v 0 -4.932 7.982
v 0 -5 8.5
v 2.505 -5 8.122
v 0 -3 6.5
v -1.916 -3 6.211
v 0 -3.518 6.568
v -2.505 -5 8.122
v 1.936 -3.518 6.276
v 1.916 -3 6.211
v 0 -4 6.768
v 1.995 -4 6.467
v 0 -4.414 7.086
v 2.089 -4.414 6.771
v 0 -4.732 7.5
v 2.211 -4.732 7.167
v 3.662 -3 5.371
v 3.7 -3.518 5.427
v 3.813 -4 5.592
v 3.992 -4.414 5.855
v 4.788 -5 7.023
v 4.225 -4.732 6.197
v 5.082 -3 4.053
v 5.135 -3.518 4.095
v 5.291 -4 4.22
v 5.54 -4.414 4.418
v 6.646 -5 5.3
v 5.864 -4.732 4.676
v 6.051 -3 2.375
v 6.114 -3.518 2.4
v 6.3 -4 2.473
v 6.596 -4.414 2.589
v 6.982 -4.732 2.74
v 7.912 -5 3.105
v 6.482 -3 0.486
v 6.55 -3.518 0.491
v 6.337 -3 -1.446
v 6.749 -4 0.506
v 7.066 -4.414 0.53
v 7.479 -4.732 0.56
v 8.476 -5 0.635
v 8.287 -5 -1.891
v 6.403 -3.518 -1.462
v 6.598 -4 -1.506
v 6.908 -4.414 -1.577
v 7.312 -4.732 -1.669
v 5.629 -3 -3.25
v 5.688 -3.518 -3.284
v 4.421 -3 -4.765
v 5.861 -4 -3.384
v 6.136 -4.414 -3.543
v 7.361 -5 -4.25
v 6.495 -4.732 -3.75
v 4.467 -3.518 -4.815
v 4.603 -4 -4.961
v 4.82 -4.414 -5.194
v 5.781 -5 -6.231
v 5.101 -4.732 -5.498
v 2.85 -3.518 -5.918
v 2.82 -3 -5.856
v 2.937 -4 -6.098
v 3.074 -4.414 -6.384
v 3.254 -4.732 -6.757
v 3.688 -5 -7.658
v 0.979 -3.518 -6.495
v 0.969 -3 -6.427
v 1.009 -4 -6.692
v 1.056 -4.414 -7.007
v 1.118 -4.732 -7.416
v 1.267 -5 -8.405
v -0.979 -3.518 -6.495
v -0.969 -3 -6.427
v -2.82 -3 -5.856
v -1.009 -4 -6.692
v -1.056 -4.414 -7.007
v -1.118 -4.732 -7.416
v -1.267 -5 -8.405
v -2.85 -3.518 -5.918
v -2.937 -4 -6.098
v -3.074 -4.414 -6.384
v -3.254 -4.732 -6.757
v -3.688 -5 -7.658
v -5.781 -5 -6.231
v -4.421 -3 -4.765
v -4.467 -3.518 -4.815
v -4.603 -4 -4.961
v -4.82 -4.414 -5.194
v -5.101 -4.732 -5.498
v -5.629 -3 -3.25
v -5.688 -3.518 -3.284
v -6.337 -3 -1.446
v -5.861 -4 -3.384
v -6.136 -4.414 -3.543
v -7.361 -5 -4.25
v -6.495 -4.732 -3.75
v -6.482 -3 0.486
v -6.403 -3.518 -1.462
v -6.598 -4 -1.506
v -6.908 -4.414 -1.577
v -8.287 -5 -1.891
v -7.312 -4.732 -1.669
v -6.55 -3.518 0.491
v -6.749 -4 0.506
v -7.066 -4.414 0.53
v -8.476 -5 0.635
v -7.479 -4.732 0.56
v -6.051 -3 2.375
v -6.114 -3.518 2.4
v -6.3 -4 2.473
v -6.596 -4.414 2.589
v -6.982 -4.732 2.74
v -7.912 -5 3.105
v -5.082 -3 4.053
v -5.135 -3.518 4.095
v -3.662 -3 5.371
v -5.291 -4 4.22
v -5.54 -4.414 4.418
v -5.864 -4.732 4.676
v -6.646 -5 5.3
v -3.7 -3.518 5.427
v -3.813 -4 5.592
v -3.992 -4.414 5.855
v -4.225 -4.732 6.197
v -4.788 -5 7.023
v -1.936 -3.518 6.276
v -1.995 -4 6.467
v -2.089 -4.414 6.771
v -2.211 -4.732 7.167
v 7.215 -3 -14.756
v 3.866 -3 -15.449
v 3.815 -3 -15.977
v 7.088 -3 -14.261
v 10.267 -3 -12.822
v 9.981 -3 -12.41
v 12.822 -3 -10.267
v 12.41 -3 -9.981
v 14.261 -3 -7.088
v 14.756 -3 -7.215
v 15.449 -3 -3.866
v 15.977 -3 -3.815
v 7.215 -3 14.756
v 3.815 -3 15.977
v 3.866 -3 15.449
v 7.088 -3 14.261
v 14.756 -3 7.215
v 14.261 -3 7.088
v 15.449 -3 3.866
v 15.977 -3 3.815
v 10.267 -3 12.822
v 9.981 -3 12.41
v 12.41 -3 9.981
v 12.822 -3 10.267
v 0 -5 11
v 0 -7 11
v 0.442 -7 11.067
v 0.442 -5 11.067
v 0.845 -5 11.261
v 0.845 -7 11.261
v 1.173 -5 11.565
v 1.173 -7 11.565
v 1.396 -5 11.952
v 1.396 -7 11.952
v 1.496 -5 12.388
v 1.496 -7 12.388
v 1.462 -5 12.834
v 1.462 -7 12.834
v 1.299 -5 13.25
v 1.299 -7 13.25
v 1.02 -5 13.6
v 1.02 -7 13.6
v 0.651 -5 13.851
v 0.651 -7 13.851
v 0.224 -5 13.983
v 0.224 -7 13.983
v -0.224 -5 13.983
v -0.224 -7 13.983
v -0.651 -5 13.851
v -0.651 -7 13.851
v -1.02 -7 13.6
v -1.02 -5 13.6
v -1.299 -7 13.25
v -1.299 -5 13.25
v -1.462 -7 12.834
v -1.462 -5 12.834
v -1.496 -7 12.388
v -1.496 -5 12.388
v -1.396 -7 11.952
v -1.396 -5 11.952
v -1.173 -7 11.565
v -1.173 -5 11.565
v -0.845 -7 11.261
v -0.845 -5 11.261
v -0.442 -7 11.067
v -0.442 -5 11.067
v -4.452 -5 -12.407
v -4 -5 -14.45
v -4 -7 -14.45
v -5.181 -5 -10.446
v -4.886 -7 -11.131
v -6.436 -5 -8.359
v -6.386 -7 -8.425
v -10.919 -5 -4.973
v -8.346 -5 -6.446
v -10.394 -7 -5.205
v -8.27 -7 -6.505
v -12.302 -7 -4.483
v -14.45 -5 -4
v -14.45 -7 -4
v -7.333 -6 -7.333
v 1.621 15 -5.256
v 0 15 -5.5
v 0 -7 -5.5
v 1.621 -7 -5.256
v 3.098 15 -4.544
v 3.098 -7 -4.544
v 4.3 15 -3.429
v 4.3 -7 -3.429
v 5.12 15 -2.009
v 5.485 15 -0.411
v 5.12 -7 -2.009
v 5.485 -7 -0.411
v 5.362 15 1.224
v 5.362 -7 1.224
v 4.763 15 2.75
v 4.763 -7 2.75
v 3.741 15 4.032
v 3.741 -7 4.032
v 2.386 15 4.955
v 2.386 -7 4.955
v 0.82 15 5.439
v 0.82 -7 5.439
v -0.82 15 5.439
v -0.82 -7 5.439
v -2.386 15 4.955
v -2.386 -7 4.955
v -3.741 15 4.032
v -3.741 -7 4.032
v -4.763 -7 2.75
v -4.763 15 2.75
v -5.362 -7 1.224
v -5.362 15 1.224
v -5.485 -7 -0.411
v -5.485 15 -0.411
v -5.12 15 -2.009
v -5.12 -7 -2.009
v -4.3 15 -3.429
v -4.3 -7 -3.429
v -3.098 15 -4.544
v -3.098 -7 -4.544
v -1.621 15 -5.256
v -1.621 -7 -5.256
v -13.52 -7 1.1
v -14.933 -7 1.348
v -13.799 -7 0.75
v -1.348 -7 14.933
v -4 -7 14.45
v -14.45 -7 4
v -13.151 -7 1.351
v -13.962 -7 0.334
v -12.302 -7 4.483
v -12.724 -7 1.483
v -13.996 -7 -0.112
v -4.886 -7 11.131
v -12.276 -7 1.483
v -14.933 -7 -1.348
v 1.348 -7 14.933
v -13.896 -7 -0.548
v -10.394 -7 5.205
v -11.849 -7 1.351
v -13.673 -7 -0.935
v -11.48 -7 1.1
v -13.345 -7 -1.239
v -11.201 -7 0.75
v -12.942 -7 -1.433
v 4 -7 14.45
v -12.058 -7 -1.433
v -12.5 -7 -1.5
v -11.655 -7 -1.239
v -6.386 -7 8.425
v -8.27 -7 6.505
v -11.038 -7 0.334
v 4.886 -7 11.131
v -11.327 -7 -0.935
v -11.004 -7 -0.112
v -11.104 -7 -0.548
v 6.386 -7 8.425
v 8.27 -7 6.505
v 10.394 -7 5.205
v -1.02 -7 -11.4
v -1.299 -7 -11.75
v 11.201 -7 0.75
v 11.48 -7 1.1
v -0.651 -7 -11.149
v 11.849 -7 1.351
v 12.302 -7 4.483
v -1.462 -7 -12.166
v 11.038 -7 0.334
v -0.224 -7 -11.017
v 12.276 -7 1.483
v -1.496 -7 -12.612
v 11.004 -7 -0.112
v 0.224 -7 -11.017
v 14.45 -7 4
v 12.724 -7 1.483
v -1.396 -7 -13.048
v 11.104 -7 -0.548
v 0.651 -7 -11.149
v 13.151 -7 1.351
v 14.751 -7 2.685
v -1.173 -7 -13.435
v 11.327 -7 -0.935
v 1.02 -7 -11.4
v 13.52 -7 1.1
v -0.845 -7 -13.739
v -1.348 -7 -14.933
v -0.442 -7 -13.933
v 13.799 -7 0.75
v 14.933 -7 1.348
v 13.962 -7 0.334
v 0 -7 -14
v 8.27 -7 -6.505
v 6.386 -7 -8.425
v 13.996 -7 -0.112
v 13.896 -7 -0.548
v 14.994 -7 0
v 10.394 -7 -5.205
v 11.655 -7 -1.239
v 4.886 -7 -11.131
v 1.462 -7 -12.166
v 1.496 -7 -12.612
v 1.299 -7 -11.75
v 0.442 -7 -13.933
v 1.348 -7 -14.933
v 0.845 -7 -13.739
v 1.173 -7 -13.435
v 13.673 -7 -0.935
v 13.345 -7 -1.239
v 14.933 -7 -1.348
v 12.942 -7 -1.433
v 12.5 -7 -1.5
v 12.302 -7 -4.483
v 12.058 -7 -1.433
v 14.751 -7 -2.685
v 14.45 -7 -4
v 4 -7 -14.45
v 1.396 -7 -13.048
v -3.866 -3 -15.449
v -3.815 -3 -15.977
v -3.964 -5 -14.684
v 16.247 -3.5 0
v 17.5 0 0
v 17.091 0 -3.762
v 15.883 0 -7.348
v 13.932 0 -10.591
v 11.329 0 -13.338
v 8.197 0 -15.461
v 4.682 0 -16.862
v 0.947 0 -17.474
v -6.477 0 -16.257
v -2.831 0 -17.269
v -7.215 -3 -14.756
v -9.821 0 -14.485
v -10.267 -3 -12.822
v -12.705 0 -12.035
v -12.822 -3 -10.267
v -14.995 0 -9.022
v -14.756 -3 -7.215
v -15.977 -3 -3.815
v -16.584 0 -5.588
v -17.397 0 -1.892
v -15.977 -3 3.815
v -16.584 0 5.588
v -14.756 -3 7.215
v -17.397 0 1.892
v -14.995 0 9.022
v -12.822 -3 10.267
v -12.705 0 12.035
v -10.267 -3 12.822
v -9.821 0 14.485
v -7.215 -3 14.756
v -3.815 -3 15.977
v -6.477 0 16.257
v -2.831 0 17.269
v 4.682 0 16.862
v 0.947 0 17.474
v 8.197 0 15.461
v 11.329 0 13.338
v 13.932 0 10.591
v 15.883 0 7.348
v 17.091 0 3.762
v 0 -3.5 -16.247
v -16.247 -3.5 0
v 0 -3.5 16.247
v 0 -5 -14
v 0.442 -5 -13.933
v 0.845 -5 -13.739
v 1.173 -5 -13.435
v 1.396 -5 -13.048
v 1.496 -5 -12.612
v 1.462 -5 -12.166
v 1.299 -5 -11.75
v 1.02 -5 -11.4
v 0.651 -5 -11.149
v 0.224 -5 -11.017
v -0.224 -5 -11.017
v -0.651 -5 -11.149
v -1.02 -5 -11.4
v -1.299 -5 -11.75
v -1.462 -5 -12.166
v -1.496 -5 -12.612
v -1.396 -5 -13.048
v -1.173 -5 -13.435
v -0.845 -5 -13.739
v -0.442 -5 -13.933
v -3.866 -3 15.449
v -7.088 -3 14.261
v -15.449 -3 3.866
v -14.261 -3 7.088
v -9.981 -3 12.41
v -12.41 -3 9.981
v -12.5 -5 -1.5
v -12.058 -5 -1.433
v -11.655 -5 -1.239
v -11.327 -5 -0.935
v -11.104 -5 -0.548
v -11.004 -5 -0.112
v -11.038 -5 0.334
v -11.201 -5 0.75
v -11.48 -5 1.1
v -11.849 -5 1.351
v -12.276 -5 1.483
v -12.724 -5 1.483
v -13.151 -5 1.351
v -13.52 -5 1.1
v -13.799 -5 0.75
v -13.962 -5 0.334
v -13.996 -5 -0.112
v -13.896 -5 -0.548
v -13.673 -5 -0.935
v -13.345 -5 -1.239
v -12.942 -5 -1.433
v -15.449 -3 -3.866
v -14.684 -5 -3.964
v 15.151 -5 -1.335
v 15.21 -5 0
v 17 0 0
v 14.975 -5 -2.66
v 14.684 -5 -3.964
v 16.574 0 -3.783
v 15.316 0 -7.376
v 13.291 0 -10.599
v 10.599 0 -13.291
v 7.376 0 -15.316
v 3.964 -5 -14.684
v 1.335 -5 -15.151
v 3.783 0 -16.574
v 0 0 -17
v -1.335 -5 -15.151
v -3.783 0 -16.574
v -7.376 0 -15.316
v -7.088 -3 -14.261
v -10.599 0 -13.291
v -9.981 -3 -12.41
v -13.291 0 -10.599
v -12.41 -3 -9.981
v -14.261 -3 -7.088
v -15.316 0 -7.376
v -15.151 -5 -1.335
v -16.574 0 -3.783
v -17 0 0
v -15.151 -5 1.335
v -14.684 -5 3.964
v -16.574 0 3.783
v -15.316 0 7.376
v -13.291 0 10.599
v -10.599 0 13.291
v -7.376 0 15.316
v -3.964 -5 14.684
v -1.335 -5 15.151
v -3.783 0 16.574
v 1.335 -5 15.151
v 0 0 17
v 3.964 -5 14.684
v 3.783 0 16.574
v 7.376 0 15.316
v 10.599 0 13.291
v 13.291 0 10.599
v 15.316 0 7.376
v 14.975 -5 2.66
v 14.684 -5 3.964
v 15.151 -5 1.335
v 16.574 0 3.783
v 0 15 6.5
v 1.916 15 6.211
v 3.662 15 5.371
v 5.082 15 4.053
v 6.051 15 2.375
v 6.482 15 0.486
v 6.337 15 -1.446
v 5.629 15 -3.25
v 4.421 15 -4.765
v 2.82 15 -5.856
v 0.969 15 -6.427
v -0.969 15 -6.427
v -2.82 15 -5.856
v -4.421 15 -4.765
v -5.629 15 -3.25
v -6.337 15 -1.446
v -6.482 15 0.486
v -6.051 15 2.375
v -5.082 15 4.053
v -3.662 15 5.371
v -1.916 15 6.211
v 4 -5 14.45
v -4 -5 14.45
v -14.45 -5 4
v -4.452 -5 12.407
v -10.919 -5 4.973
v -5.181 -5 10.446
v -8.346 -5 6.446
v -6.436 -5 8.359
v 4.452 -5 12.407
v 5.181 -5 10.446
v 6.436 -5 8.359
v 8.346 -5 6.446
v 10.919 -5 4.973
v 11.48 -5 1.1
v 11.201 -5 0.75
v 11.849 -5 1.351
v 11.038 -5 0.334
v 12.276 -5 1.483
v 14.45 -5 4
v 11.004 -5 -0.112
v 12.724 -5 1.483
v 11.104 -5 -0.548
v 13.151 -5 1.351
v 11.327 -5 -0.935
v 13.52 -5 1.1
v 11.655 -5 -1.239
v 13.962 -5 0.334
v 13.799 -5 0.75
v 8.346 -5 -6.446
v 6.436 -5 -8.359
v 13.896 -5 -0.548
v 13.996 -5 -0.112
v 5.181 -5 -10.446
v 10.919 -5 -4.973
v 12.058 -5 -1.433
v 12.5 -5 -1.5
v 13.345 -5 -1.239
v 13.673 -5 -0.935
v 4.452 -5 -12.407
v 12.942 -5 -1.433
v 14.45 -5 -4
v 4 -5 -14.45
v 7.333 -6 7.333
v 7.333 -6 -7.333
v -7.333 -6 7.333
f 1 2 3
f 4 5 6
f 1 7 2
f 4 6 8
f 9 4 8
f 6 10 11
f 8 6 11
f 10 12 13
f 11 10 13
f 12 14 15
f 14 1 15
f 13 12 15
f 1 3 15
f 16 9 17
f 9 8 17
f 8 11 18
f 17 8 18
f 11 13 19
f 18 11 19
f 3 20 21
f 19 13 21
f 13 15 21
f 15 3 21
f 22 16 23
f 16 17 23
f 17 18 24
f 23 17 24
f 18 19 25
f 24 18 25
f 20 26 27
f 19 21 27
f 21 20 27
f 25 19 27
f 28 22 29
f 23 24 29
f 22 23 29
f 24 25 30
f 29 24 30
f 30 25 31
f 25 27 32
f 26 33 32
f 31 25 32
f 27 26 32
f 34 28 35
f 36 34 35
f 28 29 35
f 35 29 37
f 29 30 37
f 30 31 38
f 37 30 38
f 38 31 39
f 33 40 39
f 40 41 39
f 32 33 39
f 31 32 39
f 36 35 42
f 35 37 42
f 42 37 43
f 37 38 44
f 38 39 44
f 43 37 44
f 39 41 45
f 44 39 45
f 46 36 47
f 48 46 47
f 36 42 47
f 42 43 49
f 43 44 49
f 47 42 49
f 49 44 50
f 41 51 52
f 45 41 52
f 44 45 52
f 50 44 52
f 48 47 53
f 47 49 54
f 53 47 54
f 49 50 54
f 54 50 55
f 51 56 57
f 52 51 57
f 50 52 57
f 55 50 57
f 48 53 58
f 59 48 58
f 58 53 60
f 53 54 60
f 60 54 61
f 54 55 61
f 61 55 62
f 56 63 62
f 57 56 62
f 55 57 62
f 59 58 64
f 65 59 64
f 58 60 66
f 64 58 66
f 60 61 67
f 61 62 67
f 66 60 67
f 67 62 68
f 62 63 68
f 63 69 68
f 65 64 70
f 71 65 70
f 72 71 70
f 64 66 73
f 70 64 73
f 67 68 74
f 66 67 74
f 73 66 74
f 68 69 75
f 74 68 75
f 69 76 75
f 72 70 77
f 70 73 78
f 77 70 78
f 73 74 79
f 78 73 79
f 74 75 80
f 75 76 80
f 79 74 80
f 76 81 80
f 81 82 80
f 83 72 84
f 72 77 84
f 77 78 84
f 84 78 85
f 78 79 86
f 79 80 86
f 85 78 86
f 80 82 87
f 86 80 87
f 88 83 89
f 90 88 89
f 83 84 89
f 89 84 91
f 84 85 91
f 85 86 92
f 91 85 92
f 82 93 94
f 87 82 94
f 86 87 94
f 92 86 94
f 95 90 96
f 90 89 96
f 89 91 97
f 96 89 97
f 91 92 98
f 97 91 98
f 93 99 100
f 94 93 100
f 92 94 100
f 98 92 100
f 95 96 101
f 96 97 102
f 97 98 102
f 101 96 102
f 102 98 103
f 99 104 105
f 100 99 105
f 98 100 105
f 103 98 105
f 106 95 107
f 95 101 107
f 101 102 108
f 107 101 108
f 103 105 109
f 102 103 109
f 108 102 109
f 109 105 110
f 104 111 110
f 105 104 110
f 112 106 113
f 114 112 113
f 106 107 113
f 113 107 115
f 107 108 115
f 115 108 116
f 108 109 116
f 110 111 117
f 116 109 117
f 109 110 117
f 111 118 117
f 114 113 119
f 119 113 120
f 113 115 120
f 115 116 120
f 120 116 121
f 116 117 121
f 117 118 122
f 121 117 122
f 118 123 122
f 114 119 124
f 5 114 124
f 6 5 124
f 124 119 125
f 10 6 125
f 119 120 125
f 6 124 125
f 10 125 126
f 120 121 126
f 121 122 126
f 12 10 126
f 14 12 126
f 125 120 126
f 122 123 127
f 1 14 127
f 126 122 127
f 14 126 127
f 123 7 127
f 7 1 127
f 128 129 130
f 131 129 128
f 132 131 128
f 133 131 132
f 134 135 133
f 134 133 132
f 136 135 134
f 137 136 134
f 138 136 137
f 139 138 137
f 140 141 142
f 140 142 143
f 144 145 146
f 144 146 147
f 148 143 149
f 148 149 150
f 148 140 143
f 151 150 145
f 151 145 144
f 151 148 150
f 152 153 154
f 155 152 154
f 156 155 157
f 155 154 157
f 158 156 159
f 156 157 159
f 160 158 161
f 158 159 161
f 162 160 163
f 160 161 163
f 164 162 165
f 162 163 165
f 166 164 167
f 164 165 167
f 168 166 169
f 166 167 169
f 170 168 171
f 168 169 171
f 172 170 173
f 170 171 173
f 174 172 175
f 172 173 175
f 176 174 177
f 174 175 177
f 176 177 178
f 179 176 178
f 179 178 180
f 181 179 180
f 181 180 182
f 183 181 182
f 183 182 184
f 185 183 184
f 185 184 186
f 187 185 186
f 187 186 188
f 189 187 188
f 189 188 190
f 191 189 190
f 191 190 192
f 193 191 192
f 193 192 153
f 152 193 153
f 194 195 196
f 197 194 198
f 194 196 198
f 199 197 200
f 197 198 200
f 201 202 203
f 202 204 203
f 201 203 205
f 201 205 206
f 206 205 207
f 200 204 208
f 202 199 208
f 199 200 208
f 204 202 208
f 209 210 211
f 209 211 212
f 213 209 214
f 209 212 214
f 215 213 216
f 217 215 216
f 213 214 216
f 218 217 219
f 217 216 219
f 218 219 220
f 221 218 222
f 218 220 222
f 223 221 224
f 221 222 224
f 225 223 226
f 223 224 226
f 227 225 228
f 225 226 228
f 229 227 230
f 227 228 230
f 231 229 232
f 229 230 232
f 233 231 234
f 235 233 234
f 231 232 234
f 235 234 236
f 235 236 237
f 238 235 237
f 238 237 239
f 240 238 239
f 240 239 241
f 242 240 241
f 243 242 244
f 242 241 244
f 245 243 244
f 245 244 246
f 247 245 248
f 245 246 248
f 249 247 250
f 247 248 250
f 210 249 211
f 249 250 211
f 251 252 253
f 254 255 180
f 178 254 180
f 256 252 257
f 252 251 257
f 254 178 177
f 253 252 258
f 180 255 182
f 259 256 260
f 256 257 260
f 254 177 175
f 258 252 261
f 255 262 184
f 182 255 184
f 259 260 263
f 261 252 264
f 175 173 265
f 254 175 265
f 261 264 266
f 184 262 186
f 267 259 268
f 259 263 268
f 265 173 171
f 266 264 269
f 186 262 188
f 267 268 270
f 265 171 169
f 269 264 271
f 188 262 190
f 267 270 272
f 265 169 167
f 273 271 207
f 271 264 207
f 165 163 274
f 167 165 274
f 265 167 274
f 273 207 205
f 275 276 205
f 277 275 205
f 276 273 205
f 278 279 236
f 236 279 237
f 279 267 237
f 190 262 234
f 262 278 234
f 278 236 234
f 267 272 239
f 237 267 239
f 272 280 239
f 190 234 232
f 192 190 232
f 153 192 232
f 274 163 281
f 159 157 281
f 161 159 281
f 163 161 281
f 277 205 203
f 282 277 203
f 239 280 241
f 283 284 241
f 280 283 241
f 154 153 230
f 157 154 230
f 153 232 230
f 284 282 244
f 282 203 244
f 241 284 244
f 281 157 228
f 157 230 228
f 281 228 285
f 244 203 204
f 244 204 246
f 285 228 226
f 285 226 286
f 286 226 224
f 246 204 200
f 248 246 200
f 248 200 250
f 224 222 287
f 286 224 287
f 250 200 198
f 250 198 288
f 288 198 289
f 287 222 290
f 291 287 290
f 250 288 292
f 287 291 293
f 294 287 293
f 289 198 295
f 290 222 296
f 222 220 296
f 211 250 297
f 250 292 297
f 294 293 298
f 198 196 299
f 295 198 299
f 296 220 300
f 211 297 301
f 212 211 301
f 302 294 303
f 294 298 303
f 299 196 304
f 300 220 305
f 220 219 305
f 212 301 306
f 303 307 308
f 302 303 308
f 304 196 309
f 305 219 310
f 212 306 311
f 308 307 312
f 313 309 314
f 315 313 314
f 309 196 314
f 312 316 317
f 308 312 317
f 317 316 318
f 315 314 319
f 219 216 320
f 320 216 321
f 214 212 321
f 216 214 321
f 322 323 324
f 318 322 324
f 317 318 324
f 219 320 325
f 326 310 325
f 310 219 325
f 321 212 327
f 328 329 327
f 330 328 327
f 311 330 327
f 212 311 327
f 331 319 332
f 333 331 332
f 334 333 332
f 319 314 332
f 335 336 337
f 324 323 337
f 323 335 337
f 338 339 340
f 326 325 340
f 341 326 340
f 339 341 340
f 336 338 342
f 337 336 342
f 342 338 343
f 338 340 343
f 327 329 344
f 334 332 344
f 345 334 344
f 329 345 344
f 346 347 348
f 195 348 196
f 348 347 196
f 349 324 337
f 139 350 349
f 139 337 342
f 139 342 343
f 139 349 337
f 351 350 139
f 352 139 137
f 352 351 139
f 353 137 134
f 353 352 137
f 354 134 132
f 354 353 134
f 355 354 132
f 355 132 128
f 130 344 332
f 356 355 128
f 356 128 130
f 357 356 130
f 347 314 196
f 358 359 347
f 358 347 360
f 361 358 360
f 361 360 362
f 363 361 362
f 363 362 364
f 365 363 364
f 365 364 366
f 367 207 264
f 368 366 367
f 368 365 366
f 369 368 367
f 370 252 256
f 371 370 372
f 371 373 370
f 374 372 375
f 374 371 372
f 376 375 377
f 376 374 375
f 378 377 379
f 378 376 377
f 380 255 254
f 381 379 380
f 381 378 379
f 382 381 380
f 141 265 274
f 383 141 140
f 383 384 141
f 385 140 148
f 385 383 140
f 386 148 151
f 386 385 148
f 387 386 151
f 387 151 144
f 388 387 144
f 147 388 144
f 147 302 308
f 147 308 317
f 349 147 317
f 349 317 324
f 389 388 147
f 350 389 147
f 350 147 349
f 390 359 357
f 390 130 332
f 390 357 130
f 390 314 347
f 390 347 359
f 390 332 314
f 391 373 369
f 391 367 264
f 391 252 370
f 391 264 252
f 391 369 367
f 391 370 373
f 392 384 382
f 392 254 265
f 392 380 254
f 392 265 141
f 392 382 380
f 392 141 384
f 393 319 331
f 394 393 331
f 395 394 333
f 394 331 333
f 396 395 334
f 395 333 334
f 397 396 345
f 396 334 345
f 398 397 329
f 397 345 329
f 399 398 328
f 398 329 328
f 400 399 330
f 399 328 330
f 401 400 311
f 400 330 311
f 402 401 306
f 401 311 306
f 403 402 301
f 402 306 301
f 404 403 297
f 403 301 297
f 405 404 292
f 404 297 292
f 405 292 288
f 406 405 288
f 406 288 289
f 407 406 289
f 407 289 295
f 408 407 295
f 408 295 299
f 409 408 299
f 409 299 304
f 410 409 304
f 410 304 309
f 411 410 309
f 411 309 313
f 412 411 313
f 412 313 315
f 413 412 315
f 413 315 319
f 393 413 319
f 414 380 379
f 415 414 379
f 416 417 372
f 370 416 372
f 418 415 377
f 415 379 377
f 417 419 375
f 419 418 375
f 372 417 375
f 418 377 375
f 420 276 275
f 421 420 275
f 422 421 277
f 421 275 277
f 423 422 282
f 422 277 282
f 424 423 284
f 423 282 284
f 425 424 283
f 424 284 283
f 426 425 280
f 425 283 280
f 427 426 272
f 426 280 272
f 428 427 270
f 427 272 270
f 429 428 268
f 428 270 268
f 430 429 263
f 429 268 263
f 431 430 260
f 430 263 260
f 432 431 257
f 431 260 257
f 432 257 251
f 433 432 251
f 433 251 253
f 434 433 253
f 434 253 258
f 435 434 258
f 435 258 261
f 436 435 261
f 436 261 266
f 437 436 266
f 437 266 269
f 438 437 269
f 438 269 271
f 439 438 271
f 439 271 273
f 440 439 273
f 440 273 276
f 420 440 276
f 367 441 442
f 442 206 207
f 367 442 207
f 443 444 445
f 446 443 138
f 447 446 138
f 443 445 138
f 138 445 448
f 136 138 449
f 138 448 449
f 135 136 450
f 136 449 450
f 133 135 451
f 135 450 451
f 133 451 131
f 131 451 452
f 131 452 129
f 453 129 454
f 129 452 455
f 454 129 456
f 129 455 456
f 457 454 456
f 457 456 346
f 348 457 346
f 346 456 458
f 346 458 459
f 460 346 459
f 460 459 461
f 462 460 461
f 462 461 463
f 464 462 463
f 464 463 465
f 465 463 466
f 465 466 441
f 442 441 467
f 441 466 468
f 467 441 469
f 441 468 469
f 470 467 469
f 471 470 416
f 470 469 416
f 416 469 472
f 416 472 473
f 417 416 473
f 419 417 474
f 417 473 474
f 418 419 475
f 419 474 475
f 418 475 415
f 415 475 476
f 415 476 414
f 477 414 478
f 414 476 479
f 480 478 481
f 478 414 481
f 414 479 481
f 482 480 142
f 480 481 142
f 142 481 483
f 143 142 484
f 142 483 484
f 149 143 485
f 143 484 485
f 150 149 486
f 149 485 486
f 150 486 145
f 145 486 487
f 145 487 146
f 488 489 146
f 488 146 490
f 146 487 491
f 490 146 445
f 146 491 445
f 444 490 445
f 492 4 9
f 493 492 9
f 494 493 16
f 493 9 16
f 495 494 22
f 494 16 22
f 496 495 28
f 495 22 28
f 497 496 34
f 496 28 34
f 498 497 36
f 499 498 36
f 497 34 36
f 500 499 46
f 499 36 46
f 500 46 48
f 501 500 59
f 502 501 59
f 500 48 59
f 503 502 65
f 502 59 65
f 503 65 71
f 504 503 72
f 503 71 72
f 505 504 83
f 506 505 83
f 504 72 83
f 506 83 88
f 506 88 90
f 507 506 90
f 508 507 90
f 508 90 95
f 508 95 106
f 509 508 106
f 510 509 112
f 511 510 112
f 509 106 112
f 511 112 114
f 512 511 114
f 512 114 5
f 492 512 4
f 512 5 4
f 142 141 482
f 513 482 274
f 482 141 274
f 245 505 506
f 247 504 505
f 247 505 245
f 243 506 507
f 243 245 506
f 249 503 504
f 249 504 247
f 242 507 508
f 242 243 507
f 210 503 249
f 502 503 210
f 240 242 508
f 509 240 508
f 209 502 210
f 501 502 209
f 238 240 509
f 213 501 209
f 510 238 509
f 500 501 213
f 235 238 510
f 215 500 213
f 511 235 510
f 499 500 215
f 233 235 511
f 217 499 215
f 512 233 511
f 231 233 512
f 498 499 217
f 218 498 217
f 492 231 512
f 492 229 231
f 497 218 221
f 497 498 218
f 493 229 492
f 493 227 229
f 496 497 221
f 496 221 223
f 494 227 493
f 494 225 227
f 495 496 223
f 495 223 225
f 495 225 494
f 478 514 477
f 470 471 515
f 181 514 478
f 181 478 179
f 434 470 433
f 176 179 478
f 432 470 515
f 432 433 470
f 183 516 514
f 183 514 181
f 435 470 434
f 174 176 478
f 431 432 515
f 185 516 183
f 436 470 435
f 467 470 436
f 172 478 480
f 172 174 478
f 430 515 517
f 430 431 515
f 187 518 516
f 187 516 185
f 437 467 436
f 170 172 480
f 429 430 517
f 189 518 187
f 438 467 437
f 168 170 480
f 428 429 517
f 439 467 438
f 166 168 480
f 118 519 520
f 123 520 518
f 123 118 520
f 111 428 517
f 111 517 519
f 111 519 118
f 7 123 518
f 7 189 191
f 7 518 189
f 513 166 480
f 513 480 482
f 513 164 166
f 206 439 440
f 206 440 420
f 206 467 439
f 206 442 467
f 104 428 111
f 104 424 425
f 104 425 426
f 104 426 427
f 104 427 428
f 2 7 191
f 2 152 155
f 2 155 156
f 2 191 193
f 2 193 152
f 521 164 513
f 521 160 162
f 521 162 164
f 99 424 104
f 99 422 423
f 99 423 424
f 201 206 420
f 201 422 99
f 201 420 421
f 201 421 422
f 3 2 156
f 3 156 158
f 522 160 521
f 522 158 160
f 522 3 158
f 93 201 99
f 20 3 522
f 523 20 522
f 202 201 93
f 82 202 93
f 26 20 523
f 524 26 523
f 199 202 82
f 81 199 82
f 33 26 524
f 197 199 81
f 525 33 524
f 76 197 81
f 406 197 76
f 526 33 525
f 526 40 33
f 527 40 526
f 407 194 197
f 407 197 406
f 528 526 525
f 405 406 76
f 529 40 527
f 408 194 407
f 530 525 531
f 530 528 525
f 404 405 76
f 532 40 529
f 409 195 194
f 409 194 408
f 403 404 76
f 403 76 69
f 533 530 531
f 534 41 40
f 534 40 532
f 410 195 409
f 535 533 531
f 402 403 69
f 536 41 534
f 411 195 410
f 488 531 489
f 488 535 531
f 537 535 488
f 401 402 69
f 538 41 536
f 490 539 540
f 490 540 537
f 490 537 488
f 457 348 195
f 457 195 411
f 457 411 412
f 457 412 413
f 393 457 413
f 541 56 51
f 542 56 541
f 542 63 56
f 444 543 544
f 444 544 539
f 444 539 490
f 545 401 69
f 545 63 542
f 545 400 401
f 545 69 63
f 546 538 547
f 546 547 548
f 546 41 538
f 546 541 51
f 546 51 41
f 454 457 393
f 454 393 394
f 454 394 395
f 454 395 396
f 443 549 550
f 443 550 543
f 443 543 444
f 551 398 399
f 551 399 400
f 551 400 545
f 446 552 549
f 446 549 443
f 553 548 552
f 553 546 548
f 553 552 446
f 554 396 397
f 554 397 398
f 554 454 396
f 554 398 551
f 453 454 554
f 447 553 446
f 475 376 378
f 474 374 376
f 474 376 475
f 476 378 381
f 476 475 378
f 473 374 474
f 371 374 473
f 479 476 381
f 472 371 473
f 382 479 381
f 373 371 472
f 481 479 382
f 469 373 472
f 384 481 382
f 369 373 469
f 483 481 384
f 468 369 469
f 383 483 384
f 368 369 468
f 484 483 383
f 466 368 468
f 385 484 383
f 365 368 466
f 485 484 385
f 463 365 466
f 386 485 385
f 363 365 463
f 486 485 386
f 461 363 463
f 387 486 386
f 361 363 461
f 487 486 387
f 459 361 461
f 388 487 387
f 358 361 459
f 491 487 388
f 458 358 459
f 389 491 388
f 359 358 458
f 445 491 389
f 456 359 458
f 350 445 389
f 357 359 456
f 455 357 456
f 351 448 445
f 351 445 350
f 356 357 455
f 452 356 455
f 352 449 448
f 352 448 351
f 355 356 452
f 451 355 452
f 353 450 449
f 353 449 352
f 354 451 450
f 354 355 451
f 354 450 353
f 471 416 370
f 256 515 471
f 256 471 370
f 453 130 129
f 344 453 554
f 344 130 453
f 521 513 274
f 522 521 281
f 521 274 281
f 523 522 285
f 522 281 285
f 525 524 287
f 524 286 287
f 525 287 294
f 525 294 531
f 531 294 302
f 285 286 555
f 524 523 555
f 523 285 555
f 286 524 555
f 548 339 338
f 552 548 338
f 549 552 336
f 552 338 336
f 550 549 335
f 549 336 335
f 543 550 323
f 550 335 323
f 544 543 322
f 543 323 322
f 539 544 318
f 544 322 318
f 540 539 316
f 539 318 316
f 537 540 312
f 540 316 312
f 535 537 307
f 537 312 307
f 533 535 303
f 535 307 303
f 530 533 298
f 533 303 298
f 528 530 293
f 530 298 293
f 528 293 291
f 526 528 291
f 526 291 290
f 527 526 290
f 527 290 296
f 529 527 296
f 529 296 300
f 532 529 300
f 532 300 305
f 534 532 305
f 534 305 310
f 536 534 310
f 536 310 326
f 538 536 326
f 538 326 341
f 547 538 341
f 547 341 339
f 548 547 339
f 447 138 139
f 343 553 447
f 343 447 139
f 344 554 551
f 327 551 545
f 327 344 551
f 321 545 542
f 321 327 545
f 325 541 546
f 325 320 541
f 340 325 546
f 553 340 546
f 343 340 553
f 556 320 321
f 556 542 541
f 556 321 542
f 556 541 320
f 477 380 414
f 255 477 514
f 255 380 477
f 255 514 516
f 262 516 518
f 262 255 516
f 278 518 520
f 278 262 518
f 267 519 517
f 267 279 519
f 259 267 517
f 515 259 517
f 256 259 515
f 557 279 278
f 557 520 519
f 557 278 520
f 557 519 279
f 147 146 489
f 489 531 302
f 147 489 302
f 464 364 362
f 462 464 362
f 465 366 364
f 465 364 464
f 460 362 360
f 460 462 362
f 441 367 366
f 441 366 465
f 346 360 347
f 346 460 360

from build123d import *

# Parameters (mm, degrees)
SKETCH1_R           = 17.5
BOSS_EXTRUDE1_DEPTH = 7
BOSS_EXTRUDE1_DRAFT = -19.7
SKETCH5_R           = 17
CUT_EXTRUDE1_DEPTH  = 5
CUT_EXTRUDE1_DRAFT  = -19.7
CUT_EXTRUDE2_DEPTH  = 4
SKETCH7_R           = 5.5
CUT_EXTRUDE3_DEPTH  = 26.719642463
SKETCH8_R           = 1.5
CUT_EXTRUDE4_DEPTH  = 26.719642463
SKETCH9_R           = 6.5
BOSS_EXTRUDE2_DEPTH = 20
FILLET1_R           = 2
SKETCH10_R          = 5.5
CUT_EXTRUDE5_DEPTH  = 32.819805263


with BuildPart() as part:
    # Sketch1 → Boss-Extrude1 (with draft: the straight prism first)
    with BuildSketch(Plane(origin=(0, 0, 0), x_dir=(1, 0, 0), z_dir=(0, 1, 0))):
        Circle(SKETCH1_R)
    extrude(amount=-BOSS_EXTRUDE1_DEPTH)
    # Boss-Extrude1: the draft: its side faces are tilted about the plane it starts from
    boss_extrude1_sides = [part.faces().sort_by_distance(p)[0] for p in [
        (-17.5, -3.5, 0),
    ]]
    draft(boss_extrude1_sides, Plane(origin=(0, 0, 0), x_dir=(1, 0, 0), z_dir=(0, 1, 0)), BOSS_EXTRUDE1_DRAFT)


with BuildPart() as cut_extrude1_tool:
    # Sketch5 → Cut-Extrude1 (with draft: the straight prism first)
    with BuildSketch(Plane(origin=(0, 0, 0), x_dir=(1, 0, 0), z_dir=(0, 1, 0))):
        Circle(SKETCH5_R)
    extrude(amount=-CUT_EXTRUDE1_DEPTH)
    # Cut-Extrude1: the draft: its side faces are tilted about the plane it starts from
    cut_extrude1_sides = [cut_extrude1_tool.faces().sort_by_distance(p)[0] for p in [
        (-17, -2.5, 0),
    ]]
    draft(cut_extrude1_sides, Plane(origin=(0, 0, 0), x_dir=(1, 0, 0), z_dir=(0, 1, 0)), CUT_EXTRUDE1_DRAFT)


with BuildPart() as part_1:
    add(part.part)

    # Cut-Extrude1: cut by cut_extrude1_tool
    add(cut_extrude1_tool.part, mode=Mode.SUBTRACT)

    # Sketch6 → Cut-Extrude2 (cut)
    with BuildSketch(Plane.XZ.offset(7)):
        with BuildLine():
            add(Edge.make_bspline(
                [(-3.745787555, 17.094416503), (-3.800126667, 15.699556272), (-4, 14.450230262)],
                knots=[0, 0, 0, 0.108565408, 0.108565408, 0.108565408], degree=2))
            ThreePointArc((-3.745787555, 17.094416503), (-12.374368671, 12.374368671), (-17.094416503, 3.745787555))
            add(Edge.make_bspline(
                [(-14.450230262, 4), (-15.699556272, 3.800126667), (-17.094416503, 3.745787555)],
                knots=[0.891434592, 0.891434592, 0.891434592, 1, 1, 1], degree=2))
            ThreePointArc((-14.450230262, 4), (-10.602102495, 10.602102495), (-4, 14.450230262))
        make_face()
        with BuildLine():
            add(Edge.make_bspline(
                [(-4, 14.450230262), (-5.441294026, 5.441294026), (-14.450230262, 4)],
                knots=[0.108565408, 0.108565408, 0.108565408, 0.891434592, 0.891434592, 0.891434592], degree=2))
            ThreePointArc((-4, 14.450230262), (-10.602102495, 10.602102495), (-14.450230262, 4))
        make_face()
        with BuildLine():
            ThreePointArc((-17.094416503, -3.745787555), (-12.374368671, -12.374368671), (-3.745787555, -17.094416503))
            add(Edge.make_bspline(
                [(-3.745787555, -17.094416503), (-3.800126667, -15.699556272), (-4, -14.450230262)],
                knots=[0, 0, 0, 0.108565408, 0.108565408, 0.108565408], degree=2))
            ThreePointArc((-4, -14.450230262), (-10.602102495, -10.602102495), (-14.450230262, -4))
            add(Edge.make_bspline(
                [(-14.450230262, -4), (-15.699556272, -3.800126667), (-17.094416503, -3.745787555)],
                knots=[0.891434592, 0.891434592, 0.891434592, 1, 1, 1], degree=2))
        make_face()
        with BuildLine():
            ThreePointArc((-14.450230262, -4), (-10.602102495, -10.602102495), (-4, -14.450230262))
            add(Edge.make_bspline(
                [(-4, -14.450230262), (-5.441294026, -5.441294026), (-14.450230262, -4)],
                knots=[0.108565408, 0.108565408, 0.108565408, 0.891434592, 0.891434592, 0.891434592], degree=2))
        make_face()
        with BuildLine():
            ThreePointArc((4, -14.450230262), (10.602102495, -10.602102495), (14.450230262, -4))
            add(Edge.make_bspline(
                [(4, -14.450230262), (5.441294026, -5.441294026), (14.450230262, -4)],
                knots=[0.108565408, 0.108565408, 0.108565408, 0.891434592, 0.891434592, 0.891434592], degree=2))
        make_face()
        with BuildLine():
            ThreePointArc((3.745787555, -17.094416503), (12.374368671, -12.374368671), (17.094416503, -3.745787555))
            add(Edge.make_bspline(
                [(14.450230262, -4), (15.699556272, -3.800126667), (17.094416503, -3.745787555)],
                knots=[0.891434592, 0.891434592, 0.891434592, 1, 1, 1], degree=2))
            ThreePointArc((14.450230262, -4), (10.602102495, -10.602102495), (4, -14.450230262))
            add(Edge.make_bspline(
                [(3.745787555, -17.094416503), (3.800126667, -15.699556272), (4, -14.450230262)],
                knots=[0, 0, 0, 0.108565408, 0.108565408, 0.108565408], degree=2))
        make_face()
        with BuildLine():
            add(Edge.make_bspline(
                [(4, 14.450230262), (5.441294026, 5.441294026), (14.450230262, 4)],
                knots=[0.108565408, 0.108565408, 0.108565408, 0.891434592, 0.891434592, 0.891434592], degree=2))
            ThreePointArc((14.450230262, 4), (10.602102495, 10.602102495), (4, 14.450230262))
        make_face()
        with BuildLine():
            add(Edge.make_bspline(
                [(14.450230262, 4), (15.699556272, 3.800126667), (17.094416503, 3.745787555)],
                knots=[0.891434592, 0.891434592, 0.891434592, 1, 1, 1], degree=2))
            ThreePointArc((17.094416503, 3.745787555), (12.374368671, 12.374368671), (3.745787555, 17.094416503))
            add(Edge.make_bspline(
                [(3.745787555, 17.094416503), (3.800126667, 15.699556272), (4, 14.450230262)],
                knots=[0, 0, 0, 0.108565408, 0.108565408, 0.108565408], degree=2))
            ThreePointArc((4, 14.450230262), (10.602102495, 10.602102495), (14.450230262, 4))
        make_face()
    extrude(amount=-CUT_EXTRUDE2_DEPTH, mode=Mode.SUBTRACT)

    # Sketch7 → Cut-Extrude3 (cut, through all)
    with BuildSketch(Plane.XZ.offset(7)):
        with Locations(Location((0, 0, 0), (0, 0, 270))):
            Circle(SKETCH7_R)
    extrude(amount=-CUT_EXTRUDE3_DEPTH, mode=Mode.SUBTRACT)

    # Sketch8 → Cut-Extrude4 (cut, through all)
    with BuildSketch(Plane.XZ.offset(7)):
        with Locations(Location((-12.5, 0, 0), (0, 0, 270))):
            Circle(SKETCH8_R)
        with Locations(Location((0, 12.5, 0), (0, 0, 270))):
            Circle(SKETCH8_R)
        with Locations(Location((12.5, 0, 0), (0, 0, 270))):
            Circle(SKETCH8_R)
        with Locations(Location((0, -12.5, 0), (0, 0, 270))):
            Circle(SKETCH8_R)
    extrude(amount=-CUT_EXTRUDE4_DEPTH, mode=Mode.SUBTRACT)

    # Sketch9 → Boss-Extrude2 (add)
    with BuildSketch(Plane(origin=(0, -5, 0), x_dir=(1, 0, 0), z_dir=(0, 1, 0))):
        with Locations(Location((0, 0, 0), (0, 0, 270))):
            Circle(SKETCH9_R)
    extrude(amount=BOSS_EXTRUDE2_DEPTH)

    # Fillet1
    fillet1_edges = [part_1.edges().sort_by_distance(p)[0] for p in [
        (0, -5, -6.5),
    ]]
    fillet(fillet1_edges, radius=FILLET1_R)

    # Sketch10 → Cut-Extrude5 (cut, through all)
    with BuildSketch(Plane.XZ.offset(5)):
        with Locations(Location((0, 0, 0), (0, 0, 270))):
            Circle(SKETCH10_R)
    extrude(amount=-CUT_EXTRUDE5_DEPTH, mode=Mode.SUBTRACT)


solid = part_1.part
